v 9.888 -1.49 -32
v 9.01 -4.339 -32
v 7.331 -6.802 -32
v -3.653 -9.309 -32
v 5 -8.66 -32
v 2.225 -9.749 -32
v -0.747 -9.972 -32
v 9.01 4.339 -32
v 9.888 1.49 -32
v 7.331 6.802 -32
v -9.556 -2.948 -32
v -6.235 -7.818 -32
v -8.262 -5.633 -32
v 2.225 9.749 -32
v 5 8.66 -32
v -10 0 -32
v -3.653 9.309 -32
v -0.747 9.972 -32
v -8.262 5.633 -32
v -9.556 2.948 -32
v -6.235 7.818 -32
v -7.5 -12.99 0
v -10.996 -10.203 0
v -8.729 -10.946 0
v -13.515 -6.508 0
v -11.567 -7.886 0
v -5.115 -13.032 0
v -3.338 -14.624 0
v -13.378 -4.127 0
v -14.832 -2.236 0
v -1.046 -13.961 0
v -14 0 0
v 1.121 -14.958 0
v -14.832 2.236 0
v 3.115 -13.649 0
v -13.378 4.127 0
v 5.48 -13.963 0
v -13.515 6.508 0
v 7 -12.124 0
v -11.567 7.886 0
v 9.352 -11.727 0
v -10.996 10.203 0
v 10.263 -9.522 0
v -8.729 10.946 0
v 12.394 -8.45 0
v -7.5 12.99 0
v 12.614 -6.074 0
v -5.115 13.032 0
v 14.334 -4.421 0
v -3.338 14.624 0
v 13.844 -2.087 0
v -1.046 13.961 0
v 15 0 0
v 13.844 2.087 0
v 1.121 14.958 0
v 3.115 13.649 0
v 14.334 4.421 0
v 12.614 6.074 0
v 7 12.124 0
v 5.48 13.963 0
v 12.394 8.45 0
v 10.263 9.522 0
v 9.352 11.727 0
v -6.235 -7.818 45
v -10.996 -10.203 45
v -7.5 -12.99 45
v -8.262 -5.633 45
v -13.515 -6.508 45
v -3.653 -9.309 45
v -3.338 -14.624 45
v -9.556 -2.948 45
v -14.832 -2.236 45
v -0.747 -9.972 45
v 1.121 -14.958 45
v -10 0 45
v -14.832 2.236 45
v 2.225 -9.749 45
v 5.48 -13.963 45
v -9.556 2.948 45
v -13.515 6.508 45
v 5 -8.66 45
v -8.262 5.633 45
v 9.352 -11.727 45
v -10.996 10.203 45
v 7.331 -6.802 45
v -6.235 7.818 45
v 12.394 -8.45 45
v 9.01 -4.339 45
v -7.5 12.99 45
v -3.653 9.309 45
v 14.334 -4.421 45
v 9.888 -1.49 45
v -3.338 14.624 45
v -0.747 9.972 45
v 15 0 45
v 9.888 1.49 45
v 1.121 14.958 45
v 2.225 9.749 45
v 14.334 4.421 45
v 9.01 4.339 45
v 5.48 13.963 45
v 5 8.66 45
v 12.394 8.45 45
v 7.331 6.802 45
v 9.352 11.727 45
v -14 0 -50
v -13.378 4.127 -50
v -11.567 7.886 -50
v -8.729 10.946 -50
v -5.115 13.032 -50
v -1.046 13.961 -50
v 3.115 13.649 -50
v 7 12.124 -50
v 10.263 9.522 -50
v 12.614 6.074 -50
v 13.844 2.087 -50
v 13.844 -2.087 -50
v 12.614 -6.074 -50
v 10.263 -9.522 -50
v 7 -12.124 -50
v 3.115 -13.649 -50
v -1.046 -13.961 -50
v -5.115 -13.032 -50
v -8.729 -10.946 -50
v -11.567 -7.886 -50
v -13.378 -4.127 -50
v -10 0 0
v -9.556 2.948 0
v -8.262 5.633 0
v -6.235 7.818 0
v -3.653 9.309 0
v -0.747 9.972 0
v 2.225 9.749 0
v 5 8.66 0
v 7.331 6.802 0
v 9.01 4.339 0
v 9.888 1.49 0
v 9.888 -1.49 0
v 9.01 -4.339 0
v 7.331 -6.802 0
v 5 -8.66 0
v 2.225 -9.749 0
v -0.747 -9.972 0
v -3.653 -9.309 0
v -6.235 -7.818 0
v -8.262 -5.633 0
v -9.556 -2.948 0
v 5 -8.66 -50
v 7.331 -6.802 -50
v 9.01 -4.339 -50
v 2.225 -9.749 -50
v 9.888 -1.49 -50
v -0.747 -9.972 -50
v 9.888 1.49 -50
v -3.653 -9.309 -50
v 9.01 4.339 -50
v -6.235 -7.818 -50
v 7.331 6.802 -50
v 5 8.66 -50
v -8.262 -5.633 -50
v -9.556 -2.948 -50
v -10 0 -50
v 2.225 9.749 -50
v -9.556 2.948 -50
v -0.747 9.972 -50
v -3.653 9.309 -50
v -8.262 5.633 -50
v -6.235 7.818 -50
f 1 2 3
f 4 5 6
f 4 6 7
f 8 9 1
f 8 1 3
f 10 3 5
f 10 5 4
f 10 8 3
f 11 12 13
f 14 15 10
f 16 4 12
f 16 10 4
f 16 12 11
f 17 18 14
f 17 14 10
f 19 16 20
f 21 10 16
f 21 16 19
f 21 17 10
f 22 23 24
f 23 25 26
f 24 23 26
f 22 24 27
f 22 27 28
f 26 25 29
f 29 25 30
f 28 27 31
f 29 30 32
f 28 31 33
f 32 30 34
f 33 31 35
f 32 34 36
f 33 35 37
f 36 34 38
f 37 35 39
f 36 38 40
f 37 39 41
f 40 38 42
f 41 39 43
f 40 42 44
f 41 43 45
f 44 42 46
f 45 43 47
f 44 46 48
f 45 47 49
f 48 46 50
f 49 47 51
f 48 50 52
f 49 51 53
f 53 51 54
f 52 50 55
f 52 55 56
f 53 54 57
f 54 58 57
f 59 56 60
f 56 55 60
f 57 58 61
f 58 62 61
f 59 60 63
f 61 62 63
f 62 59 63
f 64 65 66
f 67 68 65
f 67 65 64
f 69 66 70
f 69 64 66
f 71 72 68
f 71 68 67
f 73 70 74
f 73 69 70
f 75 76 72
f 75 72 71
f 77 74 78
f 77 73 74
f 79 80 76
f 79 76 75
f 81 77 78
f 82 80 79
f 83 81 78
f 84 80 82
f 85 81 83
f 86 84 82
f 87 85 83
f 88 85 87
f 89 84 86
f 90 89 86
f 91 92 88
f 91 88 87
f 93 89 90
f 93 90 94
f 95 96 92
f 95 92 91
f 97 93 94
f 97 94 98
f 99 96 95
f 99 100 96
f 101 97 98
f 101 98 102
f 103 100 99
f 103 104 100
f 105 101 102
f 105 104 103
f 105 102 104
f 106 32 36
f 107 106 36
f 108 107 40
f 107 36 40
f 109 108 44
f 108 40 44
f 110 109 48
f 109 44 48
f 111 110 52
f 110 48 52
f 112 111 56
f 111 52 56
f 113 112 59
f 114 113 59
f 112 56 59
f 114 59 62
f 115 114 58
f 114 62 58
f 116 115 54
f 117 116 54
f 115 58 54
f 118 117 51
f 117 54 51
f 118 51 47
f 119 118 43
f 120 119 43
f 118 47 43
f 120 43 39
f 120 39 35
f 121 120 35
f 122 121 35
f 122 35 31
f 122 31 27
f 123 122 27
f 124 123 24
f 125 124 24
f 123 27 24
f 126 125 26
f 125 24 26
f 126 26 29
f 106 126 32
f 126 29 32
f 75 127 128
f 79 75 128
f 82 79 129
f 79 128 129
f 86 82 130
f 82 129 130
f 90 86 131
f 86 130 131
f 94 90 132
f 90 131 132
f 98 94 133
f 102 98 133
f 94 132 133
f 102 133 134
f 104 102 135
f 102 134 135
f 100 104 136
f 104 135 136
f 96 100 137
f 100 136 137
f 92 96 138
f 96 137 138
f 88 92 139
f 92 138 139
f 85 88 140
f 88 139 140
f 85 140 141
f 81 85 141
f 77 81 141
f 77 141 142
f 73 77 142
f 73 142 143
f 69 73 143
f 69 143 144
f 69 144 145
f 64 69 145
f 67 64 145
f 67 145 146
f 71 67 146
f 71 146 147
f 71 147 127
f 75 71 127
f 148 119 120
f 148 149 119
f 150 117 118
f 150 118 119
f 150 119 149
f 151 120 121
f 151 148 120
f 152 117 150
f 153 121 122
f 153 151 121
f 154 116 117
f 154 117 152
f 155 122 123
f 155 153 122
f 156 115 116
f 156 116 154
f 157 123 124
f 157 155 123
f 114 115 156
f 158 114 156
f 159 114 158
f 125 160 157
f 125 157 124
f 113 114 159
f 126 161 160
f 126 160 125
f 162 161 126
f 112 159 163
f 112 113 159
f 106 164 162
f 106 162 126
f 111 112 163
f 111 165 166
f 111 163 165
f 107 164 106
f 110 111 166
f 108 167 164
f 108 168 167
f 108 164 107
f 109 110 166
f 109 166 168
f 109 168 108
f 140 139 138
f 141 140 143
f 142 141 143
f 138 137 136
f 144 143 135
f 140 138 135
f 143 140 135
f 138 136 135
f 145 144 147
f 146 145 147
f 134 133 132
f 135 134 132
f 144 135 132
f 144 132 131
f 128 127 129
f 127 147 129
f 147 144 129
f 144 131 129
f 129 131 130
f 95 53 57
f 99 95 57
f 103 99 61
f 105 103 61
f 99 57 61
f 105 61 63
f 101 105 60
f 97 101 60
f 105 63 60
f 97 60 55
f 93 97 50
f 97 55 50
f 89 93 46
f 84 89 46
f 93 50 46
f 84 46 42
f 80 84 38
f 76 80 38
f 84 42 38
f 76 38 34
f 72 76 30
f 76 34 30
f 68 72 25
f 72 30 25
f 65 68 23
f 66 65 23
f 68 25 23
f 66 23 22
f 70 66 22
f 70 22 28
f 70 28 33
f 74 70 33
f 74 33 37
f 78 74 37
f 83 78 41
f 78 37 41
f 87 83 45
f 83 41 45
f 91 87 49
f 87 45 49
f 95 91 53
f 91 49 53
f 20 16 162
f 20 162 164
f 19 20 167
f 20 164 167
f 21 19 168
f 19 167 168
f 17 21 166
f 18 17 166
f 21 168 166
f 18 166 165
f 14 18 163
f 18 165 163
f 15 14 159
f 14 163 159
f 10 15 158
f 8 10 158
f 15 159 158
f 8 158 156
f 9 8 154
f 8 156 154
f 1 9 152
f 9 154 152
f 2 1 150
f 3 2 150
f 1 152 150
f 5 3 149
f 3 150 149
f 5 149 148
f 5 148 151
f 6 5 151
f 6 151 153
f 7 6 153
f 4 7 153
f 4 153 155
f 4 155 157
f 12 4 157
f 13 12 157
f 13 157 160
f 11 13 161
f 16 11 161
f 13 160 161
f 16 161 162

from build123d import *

# Parameters (mm, degrees)
SKETCH1_R           = 15
BOSS_EXTRUDE1_DEPTH = 45
SKETCH2_R           = 10
CUT_EXTRUDE1_DEPTH  = 46
SKETCH3_R           = 14
BOSS_EXTRUDE2_DEPTH = 50
SKETCH5_R           = 10
CUT_EXTRUDE2_DEPTH  = 18


with BuildPart() as part:
    # Sketch1 → Boss-Extrude1 (new body)
    with BuildSketch(Plane.XY):
        Circle(SKETCH1_R)
    extrude(amount=BOSS_EXTRUDE1_DEPTH)

    # Sketch2 → Cut-Extrude1 (cut, through all)
    with BuildSketch(Plane(origin=(0, 0, 0), x_dir=(-1, 0, 0), z_dir=(0, 0, -1))):
        Circle(SKETCH2_R)
    extrude(amount=-CUT_EXTRUDE1_DEPTH, mode=Mode.SUBTRACT)

    # Sketch3 → Boss-Extrude2 (add)
    with BuildSketch(Plane(origin=(0, 0, 0), x_dir=(-1, 0, 0), z_dir=(0, 0, -1))):
        Circle(SKETCH3_R)
    extrude(amount=BOSS_EXTRUDE2_DEPTH)

    # Sketch5 → Cut-Extrude2 (cut)
    with BuildSketch(Plane(origin=(0, 0, -50), x_dir=(-1, 0, 0), z_dir=(0, 0, -1))):
        Circle(SKETCH5_R)
    extrude(amount=-CUT_EXTRUDE2_DEPTH, mode=Mode.SUBTRACT)


solid = part.part
